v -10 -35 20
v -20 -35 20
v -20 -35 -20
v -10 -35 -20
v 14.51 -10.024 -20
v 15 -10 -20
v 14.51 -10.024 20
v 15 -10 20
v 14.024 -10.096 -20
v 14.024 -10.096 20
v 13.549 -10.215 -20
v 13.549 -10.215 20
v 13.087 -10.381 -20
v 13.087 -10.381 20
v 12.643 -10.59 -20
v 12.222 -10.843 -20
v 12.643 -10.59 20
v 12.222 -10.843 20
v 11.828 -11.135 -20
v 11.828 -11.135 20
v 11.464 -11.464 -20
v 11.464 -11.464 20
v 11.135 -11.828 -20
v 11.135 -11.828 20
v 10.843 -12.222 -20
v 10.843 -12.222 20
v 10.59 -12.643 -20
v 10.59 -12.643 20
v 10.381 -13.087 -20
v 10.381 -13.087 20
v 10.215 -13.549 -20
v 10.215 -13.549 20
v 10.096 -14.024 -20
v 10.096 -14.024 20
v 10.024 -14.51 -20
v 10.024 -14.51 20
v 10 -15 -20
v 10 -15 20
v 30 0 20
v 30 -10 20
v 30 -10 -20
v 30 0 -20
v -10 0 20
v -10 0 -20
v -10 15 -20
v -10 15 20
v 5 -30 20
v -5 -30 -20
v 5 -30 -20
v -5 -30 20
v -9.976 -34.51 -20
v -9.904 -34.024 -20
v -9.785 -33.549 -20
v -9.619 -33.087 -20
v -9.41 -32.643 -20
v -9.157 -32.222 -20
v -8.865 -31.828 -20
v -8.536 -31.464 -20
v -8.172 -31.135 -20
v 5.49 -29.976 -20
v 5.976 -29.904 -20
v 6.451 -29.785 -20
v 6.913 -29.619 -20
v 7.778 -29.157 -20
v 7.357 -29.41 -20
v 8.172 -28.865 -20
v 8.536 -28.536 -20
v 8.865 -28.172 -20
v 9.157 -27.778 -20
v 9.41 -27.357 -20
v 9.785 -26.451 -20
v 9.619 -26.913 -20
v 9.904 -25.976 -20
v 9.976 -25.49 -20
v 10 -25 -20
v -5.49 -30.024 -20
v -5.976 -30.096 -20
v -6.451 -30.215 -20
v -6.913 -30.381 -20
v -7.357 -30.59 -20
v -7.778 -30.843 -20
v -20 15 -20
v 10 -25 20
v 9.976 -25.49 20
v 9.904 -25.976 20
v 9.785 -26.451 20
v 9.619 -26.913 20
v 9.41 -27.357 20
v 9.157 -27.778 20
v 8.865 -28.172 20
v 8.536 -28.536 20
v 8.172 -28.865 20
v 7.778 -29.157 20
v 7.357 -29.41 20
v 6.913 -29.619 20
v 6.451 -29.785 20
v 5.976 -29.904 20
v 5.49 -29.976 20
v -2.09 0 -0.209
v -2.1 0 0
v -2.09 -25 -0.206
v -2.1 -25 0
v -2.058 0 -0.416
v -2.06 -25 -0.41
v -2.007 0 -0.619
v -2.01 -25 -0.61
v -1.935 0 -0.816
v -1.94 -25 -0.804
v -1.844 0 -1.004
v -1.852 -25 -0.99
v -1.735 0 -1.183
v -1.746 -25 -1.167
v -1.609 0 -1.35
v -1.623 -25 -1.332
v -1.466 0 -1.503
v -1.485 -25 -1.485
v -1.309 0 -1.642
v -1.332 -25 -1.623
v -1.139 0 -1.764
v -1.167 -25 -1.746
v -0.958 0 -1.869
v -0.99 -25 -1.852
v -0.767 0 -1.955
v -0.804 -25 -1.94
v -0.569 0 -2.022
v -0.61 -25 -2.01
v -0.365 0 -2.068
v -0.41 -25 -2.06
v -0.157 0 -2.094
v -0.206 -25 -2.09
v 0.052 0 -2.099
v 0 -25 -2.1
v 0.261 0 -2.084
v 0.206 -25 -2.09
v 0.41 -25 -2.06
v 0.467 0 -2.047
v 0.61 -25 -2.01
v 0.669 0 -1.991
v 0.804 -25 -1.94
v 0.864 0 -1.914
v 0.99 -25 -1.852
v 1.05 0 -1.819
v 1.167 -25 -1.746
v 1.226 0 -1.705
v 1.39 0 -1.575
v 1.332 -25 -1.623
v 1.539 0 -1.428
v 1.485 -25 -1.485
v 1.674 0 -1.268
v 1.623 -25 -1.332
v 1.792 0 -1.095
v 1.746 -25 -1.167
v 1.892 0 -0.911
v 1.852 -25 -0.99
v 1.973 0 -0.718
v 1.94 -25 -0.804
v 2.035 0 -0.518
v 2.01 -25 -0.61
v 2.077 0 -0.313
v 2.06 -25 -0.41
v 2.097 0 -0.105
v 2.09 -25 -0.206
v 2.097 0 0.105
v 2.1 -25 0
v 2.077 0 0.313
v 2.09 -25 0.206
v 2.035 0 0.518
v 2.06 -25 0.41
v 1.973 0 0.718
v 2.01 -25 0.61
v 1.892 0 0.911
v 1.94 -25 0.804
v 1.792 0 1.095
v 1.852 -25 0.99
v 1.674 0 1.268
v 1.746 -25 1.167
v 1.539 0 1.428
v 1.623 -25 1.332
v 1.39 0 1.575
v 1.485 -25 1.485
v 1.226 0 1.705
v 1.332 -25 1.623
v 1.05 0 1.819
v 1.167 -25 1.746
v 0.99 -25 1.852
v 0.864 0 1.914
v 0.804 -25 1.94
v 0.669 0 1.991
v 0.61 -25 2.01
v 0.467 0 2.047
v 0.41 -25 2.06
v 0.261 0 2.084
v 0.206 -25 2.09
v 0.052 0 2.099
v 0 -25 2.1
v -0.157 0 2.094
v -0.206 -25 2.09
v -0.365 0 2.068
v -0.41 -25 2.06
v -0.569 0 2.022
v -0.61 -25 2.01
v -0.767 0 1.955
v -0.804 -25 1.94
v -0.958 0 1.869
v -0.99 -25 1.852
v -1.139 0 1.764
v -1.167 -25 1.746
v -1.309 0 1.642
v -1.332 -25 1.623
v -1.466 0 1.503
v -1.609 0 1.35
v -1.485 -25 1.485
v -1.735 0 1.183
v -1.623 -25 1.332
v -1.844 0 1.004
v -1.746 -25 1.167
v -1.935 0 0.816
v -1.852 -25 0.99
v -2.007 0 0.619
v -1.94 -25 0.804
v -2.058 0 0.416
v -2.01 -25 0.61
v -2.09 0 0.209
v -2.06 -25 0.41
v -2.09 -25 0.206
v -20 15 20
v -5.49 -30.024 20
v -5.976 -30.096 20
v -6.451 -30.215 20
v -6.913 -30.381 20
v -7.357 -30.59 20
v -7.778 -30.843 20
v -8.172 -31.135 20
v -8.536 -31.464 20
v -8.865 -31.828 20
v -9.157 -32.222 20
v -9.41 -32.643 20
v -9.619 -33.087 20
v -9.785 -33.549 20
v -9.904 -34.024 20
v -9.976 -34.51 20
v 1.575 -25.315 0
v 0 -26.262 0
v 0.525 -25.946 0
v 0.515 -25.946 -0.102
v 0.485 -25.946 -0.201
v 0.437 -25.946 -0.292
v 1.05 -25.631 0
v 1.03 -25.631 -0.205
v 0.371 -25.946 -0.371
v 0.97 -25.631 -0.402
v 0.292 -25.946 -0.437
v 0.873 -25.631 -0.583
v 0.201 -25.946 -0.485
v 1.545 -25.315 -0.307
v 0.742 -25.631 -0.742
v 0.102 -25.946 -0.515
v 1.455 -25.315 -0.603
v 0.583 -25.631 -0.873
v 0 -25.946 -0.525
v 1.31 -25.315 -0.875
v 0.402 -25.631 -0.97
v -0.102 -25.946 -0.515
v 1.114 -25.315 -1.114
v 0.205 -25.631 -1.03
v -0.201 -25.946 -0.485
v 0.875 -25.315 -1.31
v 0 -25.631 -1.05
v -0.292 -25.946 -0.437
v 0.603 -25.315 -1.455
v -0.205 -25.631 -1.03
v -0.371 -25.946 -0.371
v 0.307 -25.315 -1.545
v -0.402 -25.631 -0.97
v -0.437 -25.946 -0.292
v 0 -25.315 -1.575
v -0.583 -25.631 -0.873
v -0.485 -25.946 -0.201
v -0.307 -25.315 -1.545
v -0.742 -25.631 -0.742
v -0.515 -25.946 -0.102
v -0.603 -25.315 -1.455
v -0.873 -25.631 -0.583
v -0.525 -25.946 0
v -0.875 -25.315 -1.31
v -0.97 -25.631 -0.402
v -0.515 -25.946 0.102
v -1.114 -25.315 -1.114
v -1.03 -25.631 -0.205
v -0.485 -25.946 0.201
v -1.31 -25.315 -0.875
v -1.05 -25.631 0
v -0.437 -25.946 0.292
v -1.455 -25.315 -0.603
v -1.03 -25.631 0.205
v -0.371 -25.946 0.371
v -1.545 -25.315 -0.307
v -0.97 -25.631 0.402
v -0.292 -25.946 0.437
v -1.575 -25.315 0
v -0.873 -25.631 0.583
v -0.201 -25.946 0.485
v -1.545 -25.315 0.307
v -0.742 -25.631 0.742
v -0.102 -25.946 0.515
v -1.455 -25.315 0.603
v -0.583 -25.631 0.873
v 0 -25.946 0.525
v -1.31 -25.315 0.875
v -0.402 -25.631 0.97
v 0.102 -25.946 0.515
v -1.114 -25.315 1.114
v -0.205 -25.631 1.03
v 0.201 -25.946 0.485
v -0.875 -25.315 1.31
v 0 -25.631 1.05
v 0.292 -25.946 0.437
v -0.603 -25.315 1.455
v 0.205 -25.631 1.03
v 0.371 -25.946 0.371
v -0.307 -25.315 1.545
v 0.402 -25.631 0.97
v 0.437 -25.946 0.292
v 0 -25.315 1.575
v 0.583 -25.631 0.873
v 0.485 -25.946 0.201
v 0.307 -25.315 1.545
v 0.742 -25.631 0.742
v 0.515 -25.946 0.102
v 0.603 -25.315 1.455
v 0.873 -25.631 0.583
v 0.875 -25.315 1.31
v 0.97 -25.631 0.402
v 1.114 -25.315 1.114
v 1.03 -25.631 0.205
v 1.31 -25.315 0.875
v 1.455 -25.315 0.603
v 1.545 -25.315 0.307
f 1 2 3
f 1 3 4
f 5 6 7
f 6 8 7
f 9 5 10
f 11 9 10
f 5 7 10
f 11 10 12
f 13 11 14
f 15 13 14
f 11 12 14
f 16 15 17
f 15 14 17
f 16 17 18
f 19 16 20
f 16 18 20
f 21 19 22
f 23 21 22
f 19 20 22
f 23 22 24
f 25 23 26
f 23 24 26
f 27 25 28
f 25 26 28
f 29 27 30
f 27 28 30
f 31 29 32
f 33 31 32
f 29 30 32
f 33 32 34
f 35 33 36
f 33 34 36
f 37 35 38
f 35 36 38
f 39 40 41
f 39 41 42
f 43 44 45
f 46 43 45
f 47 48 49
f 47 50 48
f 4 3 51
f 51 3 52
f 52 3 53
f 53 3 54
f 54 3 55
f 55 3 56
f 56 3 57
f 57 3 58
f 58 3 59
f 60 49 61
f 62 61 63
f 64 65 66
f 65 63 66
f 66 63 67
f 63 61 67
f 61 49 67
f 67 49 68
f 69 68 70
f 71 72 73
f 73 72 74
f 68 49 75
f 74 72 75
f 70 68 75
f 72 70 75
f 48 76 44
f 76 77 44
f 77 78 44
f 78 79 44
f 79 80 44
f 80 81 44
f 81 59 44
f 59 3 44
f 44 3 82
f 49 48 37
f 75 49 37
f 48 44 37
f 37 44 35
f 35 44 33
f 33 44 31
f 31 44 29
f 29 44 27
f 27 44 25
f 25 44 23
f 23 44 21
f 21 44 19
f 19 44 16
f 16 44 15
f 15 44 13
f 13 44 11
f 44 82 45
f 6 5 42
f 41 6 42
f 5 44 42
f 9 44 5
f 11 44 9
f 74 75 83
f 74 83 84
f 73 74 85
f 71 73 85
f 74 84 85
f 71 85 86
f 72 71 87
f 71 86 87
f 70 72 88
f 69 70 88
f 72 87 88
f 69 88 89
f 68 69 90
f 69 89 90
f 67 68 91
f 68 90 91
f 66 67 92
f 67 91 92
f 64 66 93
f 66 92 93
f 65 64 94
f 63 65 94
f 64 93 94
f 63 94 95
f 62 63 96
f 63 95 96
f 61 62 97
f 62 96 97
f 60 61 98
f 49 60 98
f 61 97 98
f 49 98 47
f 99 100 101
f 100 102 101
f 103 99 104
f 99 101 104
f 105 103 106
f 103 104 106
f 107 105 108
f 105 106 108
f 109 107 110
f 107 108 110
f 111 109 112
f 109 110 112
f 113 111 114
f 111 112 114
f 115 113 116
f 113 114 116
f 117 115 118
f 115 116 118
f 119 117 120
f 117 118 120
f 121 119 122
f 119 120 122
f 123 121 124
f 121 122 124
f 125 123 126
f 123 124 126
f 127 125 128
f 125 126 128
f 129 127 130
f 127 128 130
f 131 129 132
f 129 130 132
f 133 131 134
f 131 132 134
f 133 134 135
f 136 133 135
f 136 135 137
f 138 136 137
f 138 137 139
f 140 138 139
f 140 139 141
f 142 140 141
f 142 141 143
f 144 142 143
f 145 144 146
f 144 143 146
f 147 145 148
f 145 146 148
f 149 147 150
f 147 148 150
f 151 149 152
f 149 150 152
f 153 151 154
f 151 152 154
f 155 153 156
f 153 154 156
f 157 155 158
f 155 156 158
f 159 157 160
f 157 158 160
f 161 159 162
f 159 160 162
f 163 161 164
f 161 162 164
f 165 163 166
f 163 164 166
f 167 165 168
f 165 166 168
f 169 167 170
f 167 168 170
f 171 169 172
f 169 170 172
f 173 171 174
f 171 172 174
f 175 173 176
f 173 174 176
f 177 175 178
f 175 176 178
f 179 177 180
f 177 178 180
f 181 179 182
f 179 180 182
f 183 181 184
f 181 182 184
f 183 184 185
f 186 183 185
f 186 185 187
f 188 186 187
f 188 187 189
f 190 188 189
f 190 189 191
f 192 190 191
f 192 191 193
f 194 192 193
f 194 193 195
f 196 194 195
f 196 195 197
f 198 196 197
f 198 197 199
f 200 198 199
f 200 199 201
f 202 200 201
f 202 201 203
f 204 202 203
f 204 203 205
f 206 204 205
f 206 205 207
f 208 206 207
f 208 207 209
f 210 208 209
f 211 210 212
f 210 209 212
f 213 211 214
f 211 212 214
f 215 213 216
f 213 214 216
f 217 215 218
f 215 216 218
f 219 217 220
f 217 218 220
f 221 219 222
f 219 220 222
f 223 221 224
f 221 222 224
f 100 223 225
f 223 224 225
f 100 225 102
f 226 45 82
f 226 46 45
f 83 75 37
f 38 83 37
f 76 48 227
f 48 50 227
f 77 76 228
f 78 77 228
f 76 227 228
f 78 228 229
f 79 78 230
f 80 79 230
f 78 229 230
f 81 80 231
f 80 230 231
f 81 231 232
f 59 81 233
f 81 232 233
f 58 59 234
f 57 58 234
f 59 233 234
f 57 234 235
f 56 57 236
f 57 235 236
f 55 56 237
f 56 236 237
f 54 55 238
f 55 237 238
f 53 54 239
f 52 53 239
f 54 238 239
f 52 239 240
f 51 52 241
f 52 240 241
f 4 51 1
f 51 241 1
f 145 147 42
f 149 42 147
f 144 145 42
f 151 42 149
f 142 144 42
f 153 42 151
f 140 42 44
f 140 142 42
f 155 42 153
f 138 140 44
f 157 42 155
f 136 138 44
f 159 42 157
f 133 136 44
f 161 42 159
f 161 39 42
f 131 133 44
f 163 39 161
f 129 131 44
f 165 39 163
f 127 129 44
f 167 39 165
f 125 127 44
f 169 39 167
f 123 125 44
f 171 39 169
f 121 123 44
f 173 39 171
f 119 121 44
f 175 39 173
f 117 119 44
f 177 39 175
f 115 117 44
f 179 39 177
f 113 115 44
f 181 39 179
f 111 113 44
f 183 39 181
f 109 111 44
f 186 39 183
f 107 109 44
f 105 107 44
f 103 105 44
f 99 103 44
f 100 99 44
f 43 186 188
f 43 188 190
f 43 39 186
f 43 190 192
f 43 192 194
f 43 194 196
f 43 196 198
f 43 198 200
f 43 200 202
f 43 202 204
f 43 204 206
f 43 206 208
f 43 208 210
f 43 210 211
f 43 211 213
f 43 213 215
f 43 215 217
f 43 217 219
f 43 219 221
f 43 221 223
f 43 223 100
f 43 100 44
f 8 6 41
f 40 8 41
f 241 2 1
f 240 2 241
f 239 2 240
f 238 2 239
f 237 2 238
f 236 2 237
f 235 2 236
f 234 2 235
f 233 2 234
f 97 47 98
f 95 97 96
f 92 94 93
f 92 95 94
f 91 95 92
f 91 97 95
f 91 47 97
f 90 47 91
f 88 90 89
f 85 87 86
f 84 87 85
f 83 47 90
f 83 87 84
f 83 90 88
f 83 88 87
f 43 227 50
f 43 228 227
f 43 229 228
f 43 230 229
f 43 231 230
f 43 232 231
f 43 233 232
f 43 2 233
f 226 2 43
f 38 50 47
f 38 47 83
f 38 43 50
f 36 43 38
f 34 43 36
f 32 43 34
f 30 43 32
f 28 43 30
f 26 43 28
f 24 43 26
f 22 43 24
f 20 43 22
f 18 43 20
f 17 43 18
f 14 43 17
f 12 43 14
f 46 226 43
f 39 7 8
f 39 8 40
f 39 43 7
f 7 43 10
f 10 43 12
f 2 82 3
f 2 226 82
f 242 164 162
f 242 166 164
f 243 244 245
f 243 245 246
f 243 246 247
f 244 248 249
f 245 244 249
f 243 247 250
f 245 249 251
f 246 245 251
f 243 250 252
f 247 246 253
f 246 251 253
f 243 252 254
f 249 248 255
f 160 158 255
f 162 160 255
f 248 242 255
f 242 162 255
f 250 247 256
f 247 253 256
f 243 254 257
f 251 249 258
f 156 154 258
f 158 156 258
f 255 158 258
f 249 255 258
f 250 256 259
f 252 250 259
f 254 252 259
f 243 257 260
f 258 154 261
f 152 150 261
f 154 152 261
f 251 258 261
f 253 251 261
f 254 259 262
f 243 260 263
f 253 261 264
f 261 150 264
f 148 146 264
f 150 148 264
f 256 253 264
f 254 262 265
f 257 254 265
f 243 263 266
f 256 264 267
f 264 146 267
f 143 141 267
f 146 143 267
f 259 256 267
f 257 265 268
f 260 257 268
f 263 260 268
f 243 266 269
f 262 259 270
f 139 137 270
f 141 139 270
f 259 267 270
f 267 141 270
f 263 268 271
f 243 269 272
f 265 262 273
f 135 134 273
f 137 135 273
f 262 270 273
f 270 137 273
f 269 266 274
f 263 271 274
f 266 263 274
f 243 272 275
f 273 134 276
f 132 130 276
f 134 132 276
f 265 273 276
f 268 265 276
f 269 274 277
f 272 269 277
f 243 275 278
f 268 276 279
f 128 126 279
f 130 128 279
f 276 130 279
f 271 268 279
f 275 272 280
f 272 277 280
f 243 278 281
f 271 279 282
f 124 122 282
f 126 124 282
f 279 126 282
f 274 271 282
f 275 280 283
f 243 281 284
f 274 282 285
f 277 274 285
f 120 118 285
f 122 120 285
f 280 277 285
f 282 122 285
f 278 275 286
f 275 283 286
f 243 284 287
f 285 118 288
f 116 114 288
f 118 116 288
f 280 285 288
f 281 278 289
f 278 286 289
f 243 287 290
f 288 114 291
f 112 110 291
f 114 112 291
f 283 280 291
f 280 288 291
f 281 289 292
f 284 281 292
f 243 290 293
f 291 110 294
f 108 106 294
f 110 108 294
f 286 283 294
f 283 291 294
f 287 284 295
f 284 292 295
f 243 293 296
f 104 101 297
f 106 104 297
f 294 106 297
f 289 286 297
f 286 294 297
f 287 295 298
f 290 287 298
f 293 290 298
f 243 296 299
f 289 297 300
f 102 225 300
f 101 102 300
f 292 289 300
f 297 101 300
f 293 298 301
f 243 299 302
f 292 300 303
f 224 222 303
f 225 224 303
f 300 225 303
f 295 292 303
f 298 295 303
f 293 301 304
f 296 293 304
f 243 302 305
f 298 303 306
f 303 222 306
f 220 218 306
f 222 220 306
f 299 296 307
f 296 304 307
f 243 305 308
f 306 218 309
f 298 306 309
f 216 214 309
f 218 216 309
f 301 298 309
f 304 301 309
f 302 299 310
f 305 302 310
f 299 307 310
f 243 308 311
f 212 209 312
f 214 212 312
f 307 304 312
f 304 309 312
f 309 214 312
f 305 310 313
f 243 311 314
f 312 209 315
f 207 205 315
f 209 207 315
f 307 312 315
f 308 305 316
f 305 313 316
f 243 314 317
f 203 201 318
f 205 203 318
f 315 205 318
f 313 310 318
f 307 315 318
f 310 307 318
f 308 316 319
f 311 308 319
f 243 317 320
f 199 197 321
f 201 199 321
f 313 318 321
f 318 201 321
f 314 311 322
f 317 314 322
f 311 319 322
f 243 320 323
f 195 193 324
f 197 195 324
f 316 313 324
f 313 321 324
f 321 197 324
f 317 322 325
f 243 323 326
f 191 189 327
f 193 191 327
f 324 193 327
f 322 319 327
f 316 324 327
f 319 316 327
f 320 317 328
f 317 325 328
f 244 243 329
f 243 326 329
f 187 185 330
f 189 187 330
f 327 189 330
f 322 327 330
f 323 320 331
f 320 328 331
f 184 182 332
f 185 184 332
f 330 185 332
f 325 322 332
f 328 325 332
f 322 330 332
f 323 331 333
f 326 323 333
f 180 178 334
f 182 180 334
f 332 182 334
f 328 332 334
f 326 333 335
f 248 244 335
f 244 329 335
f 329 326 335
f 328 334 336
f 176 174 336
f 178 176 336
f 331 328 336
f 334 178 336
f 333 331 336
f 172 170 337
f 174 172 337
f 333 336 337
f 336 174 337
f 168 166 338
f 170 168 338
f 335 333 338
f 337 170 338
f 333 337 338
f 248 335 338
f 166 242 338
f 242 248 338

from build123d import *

# Parameters (mm, degrees)
BOSS_EXTRU_1_DEPTH    = 20
CONG_1_R              = 5
TROU_TARAUD_M51_D     = 4.2
TROU_TARAUD_M51_DEPTH = 25
TROU_TARAUD_M51_TIP   = 1.2618073


with BuildPart() as part:
    # Esquisse1 → Boss.-Extru.1 (new, symmetric)
    with BuildSketch(Plane.XY):
        Polygon((-20, 15), (-20, -35), (-10, -35), (-10, -30), (10, -30), (10, -10), (30, -10), (30, 0), (-10, 0), (-10, 15), align=None)
    extrude(amount=BOSS_EXTRU_1_DEPTH, both=True)

    # Congé1
    cong_1_edges = [part.edges().sort_by_distance(p)[0] for p in [
        (-10, -30, 0),
        (10, -10, 0),
        (10, -30, 0),
    ]]
    fillet(cong_1_edges, radius=CONG_1_R - 0.0001)  # a hair under: the kernel refuses the full size

    # Trou taraudé M51
    with Locations(Plane(origin=(0, 0, 0), x_dir=(1, 0, 0), z_dir=(0, 1, 0))):
        with Locations((0, 0)):
            Hole(TROU_TARAUD_M51_D / 2, depth=TROU_TARAUD_M51_DEPTH)
            with Locations((0, 0, -(TROU_TARAUD_M51_DEPTH + TROU_TARAUD_M51_TIP / 2))):  # 118° drill point
                Cone(0, TROU_TARAUD_M51_D / 2, TROU_TARAUD_M51_TIP, mode=Mode.SUBTRACT)


solid = part.part
